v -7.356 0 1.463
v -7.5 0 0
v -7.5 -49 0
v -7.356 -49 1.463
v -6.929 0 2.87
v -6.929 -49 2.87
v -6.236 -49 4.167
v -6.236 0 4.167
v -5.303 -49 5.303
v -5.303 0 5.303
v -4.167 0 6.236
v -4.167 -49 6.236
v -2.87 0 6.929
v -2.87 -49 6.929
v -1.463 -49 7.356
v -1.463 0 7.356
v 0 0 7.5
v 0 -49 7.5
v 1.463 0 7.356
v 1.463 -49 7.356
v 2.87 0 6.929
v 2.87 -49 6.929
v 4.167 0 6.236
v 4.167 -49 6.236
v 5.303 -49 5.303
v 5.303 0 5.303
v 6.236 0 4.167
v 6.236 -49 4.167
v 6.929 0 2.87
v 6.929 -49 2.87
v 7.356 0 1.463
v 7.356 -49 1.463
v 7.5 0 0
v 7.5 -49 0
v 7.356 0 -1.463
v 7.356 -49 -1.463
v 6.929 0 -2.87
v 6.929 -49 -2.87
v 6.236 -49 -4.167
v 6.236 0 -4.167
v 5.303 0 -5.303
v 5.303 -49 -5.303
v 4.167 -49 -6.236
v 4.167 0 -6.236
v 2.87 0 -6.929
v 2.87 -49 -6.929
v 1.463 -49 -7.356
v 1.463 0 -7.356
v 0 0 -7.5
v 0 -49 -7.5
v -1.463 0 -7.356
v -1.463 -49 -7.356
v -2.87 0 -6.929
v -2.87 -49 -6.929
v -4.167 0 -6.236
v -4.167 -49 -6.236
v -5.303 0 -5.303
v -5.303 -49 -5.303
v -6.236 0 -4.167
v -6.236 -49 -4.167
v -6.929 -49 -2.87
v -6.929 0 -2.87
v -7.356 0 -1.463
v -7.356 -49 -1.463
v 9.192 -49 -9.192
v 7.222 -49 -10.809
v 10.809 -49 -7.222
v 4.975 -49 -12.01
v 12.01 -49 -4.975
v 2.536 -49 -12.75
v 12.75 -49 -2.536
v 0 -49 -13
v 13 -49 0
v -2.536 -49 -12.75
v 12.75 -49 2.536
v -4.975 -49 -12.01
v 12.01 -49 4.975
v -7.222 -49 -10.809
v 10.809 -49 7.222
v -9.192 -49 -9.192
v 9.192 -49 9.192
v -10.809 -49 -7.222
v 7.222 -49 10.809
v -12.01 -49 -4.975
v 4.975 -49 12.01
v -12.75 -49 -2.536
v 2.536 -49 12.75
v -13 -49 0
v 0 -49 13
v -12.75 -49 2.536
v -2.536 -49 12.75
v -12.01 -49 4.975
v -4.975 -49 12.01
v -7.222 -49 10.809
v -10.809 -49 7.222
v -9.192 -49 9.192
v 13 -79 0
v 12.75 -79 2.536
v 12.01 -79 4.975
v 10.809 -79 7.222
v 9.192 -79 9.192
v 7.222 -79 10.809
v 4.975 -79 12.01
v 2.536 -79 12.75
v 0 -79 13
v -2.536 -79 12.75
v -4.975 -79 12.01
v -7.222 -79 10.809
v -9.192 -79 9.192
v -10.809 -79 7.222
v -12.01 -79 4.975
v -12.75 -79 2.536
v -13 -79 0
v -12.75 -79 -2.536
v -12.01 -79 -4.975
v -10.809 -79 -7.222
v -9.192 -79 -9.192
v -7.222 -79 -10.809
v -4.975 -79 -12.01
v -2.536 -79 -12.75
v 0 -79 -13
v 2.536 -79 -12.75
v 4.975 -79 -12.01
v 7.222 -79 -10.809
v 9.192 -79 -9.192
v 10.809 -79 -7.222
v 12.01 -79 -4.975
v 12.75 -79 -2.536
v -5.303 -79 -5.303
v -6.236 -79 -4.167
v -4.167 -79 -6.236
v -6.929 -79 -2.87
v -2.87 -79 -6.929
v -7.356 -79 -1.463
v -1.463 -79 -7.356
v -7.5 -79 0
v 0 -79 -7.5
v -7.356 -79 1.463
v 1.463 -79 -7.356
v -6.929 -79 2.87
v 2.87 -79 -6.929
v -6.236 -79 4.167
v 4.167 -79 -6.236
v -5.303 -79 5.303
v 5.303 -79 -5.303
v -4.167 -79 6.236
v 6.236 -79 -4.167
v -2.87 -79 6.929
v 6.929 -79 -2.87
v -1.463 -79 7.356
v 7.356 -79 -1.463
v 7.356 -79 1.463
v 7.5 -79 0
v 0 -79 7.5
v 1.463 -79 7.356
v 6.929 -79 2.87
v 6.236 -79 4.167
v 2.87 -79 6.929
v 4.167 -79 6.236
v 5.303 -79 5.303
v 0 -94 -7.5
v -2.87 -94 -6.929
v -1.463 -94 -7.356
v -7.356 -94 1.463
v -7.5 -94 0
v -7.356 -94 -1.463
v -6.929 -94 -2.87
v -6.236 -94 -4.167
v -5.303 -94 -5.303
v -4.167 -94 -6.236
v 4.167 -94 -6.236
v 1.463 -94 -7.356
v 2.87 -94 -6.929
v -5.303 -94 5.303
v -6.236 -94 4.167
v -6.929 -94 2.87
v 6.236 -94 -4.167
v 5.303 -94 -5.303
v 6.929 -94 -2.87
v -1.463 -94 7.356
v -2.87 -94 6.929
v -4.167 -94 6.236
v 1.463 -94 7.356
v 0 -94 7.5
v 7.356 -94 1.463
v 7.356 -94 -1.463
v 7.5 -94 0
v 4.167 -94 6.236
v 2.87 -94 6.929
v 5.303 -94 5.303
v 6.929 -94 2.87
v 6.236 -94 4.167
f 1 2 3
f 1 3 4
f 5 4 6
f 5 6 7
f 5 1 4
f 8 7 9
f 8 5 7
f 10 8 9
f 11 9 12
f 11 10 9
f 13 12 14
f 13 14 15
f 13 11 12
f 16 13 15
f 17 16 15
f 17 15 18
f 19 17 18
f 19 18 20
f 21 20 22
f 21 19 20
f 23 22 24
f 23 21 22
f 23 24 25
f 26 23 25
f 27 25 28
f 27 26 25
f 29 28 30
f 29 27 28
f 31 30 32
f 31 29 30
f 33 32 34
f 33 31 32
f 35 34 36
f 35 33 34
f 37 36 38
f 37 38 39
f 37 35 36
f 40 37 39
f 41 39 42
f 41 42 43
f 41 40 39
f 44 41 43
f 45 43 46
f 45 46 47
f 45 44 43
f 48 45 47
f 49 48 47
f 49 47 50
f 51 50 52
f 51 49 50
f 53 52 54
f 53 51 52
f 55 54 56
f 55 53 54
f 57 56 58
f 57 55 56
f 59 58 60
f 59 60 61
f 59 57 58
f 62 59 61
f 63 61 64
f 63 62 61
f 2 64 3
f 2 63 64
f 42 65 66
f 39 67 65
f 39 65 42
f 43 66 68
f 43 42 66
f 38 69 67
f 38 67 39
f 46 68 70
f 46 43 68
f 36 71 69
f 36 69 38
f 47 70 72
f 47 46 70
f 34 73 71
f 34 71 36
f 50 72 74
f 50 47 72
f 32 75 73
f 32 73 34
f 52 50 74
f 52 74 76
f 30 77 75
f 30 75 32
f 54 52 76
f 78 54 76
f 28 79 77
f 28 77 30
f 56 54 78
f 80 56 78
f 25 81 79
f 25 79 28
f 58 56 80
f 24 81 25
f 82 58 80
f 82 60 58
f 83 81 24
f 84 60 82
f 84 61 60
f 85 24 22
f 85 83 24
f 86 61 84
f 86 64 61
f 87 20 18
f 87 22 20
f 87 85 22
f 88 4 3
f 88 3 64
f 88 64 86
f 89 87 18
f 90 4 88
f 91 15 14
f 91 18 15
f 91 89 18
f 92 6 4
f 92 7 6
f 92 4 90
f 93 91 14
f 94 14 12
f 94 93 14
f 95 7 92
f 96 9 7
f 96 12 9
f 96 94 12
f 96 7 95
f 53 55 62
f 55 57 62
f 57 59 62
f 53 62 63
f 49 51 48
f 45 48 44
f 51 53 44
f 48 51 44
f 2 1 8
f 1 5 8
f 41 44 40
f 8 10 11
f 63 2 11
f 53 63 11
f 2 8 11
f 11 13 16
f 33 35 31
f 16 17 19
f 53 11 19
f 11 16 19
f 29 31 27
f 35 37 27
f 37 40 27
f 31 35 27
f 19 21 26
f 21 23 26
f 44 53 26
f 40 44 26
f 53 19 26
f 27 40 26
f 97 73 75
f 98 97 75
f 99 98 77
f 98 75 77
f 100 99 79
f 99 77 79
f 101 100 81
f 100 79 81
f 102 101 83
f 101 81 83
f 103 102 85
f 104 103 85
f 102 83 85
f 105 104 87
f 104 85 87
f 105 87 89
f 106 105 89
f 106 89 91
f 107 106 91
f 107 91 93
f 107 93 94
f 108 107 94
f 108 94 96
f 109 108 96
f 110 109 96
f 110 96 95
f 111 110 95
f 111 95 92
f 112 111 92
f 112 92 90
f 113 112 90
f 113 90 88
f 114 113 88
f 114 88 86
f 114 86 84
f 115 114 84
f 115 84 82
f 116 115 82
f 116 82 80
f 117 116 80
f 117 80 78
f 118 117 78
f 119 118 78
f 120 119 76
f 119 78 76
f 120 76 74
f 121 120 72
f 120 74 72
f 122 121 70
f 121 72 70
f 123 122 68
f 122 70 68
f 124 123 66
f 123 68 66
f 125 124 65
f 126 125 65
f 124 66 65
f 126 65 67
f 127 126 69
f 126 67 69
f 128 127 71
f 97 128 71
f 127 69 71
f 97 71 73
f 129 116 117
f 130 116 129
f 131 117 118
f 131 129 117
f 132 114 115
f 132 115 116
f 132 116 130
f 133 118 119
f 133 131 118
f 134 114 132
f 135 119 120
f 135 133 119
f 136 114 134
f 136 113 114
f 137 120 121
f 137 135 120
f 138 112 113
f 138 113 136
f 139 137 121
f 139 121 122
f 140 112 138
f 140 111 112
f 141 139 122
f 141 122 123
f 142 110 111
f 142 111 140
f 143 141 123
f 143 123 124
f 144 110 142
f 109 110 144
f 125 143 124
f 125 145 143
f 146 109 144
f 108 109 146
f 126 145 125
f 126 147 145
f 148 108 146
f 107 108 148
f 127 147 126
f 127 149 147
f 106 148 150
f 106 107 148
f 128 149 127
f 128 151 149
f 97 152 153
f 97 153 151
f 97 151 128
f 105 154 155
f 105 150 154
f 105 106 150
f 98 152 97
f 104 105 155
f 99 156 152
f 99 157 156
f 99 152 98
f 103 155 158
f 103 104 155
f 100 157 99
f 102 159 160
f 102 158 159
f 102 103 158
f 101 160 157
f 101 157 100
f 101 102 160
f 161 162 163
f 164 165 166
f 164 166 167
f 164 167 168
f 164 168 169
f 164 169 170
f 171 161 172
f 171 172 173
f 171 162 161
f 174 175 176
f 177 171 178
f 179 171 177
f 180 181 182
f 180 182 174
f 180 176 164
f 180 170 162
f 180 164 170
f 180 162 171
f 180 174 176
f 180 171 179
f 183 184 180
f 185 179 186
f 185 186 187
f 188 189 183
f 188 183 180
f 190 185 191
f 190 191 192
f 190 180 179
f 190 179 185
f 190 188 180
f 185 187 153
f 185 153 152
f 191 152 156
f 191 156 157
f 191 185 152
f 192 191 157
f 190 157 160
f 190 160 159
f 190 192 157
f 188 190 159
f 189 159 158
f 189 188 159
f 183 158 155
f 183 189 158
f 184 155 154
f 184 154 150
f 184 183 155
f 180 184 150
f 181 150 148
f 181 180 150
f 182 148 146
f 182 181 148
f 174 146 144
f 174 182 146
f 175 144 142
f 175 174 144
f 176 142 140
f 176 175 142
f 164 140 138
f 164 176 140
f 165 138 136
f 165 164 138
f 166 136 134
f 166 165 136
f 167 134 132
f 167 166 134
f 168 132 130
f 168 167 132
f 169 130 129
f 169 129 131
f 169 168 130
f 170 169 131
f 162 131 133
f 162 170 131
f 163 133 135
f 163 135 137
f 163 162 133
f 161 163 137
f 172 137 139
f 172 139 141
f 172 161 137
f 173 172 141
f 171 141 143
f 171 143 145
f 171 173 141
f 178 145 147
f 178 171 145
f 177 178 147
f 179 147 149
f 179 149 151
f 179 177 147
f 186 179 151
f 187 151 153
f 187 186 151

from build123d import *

# Parameters (mm, degrees)
F0_R     = 13
F1_DEPTH = 94
F2_R     = 13
F2_R_2   = 7.5
F3_DEPTH = 15
F4_R     = 13
F4_R_2   = 7.5
F5_DEPTH = 49


with BuildPart() as f1:
    # F0 (on Front) → F1 (new body)
    with BuildSketch(Plane.XZ):
        Circle(F0_R)
    extrude(amount=F1_DEPTH)

    # F2 (on face) → F3 (cut)
    with BuildSketch(Plane.XZ.offset(94)):
        Circle(F2_R)
        Circle(F2_R_2, mode=Mode.SUBTRACT)
    extrude(amount=-F3_DEPTH, mode=Mode.SUBTRACT)

    # F4 (on face) → F5 (cut)
    with BuildSketch(Plane(origin=(0, 0, 0), x_dir=(-1, 0, 0), z_dir=(0, 1, 0))):
        Circle(F4_R)
        Circle(F4_R_2, mode=Mode.SUBTRACT)
    extrude(amount=-F5_DEPTH, mode=Mode.SUBTRACT)


solid = f1.part
